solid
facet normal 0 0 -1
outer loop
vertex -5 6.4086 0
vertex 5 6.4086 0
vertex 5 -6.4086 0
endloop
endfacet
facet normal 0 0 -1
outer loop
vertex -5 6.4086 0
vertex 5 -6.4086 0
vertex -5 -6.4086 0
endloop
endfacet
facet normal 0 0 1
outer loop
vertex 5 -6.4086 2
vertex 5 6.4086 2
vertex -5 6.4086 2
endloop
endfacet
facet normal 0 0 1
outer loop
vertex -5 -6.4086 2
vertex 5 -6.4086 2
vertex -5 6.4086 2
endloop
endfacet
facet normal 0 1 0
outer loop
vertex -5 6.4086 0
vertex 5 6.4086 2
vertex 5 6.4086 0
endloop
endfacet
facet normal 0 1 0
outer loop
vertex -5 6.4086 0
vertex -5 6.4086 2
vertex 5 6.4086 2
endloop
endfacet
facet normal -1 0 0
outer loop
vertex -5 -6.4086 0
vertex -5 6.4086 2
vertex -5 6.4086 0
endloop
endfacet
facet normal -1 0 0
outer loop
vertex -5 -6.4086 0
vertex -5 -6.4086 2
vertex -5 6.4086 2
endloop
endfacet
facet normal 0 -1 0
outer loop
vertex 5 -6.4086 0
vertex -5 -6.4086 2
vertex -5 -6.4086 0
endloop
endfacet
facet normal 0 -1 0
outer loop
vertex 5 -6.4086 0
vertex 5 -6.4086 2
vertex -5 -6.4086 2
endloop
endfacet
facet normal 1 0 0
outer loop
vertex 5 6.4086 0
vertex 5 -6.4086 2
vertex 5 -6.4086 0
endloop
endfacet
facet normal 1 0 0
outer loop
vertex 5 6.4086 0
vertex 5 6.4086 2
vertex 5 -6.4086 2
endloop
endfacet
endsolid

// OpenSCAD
linear_extrude(2) projection(cut=false) rotate([20,0,0]) cube(10, center=true);
